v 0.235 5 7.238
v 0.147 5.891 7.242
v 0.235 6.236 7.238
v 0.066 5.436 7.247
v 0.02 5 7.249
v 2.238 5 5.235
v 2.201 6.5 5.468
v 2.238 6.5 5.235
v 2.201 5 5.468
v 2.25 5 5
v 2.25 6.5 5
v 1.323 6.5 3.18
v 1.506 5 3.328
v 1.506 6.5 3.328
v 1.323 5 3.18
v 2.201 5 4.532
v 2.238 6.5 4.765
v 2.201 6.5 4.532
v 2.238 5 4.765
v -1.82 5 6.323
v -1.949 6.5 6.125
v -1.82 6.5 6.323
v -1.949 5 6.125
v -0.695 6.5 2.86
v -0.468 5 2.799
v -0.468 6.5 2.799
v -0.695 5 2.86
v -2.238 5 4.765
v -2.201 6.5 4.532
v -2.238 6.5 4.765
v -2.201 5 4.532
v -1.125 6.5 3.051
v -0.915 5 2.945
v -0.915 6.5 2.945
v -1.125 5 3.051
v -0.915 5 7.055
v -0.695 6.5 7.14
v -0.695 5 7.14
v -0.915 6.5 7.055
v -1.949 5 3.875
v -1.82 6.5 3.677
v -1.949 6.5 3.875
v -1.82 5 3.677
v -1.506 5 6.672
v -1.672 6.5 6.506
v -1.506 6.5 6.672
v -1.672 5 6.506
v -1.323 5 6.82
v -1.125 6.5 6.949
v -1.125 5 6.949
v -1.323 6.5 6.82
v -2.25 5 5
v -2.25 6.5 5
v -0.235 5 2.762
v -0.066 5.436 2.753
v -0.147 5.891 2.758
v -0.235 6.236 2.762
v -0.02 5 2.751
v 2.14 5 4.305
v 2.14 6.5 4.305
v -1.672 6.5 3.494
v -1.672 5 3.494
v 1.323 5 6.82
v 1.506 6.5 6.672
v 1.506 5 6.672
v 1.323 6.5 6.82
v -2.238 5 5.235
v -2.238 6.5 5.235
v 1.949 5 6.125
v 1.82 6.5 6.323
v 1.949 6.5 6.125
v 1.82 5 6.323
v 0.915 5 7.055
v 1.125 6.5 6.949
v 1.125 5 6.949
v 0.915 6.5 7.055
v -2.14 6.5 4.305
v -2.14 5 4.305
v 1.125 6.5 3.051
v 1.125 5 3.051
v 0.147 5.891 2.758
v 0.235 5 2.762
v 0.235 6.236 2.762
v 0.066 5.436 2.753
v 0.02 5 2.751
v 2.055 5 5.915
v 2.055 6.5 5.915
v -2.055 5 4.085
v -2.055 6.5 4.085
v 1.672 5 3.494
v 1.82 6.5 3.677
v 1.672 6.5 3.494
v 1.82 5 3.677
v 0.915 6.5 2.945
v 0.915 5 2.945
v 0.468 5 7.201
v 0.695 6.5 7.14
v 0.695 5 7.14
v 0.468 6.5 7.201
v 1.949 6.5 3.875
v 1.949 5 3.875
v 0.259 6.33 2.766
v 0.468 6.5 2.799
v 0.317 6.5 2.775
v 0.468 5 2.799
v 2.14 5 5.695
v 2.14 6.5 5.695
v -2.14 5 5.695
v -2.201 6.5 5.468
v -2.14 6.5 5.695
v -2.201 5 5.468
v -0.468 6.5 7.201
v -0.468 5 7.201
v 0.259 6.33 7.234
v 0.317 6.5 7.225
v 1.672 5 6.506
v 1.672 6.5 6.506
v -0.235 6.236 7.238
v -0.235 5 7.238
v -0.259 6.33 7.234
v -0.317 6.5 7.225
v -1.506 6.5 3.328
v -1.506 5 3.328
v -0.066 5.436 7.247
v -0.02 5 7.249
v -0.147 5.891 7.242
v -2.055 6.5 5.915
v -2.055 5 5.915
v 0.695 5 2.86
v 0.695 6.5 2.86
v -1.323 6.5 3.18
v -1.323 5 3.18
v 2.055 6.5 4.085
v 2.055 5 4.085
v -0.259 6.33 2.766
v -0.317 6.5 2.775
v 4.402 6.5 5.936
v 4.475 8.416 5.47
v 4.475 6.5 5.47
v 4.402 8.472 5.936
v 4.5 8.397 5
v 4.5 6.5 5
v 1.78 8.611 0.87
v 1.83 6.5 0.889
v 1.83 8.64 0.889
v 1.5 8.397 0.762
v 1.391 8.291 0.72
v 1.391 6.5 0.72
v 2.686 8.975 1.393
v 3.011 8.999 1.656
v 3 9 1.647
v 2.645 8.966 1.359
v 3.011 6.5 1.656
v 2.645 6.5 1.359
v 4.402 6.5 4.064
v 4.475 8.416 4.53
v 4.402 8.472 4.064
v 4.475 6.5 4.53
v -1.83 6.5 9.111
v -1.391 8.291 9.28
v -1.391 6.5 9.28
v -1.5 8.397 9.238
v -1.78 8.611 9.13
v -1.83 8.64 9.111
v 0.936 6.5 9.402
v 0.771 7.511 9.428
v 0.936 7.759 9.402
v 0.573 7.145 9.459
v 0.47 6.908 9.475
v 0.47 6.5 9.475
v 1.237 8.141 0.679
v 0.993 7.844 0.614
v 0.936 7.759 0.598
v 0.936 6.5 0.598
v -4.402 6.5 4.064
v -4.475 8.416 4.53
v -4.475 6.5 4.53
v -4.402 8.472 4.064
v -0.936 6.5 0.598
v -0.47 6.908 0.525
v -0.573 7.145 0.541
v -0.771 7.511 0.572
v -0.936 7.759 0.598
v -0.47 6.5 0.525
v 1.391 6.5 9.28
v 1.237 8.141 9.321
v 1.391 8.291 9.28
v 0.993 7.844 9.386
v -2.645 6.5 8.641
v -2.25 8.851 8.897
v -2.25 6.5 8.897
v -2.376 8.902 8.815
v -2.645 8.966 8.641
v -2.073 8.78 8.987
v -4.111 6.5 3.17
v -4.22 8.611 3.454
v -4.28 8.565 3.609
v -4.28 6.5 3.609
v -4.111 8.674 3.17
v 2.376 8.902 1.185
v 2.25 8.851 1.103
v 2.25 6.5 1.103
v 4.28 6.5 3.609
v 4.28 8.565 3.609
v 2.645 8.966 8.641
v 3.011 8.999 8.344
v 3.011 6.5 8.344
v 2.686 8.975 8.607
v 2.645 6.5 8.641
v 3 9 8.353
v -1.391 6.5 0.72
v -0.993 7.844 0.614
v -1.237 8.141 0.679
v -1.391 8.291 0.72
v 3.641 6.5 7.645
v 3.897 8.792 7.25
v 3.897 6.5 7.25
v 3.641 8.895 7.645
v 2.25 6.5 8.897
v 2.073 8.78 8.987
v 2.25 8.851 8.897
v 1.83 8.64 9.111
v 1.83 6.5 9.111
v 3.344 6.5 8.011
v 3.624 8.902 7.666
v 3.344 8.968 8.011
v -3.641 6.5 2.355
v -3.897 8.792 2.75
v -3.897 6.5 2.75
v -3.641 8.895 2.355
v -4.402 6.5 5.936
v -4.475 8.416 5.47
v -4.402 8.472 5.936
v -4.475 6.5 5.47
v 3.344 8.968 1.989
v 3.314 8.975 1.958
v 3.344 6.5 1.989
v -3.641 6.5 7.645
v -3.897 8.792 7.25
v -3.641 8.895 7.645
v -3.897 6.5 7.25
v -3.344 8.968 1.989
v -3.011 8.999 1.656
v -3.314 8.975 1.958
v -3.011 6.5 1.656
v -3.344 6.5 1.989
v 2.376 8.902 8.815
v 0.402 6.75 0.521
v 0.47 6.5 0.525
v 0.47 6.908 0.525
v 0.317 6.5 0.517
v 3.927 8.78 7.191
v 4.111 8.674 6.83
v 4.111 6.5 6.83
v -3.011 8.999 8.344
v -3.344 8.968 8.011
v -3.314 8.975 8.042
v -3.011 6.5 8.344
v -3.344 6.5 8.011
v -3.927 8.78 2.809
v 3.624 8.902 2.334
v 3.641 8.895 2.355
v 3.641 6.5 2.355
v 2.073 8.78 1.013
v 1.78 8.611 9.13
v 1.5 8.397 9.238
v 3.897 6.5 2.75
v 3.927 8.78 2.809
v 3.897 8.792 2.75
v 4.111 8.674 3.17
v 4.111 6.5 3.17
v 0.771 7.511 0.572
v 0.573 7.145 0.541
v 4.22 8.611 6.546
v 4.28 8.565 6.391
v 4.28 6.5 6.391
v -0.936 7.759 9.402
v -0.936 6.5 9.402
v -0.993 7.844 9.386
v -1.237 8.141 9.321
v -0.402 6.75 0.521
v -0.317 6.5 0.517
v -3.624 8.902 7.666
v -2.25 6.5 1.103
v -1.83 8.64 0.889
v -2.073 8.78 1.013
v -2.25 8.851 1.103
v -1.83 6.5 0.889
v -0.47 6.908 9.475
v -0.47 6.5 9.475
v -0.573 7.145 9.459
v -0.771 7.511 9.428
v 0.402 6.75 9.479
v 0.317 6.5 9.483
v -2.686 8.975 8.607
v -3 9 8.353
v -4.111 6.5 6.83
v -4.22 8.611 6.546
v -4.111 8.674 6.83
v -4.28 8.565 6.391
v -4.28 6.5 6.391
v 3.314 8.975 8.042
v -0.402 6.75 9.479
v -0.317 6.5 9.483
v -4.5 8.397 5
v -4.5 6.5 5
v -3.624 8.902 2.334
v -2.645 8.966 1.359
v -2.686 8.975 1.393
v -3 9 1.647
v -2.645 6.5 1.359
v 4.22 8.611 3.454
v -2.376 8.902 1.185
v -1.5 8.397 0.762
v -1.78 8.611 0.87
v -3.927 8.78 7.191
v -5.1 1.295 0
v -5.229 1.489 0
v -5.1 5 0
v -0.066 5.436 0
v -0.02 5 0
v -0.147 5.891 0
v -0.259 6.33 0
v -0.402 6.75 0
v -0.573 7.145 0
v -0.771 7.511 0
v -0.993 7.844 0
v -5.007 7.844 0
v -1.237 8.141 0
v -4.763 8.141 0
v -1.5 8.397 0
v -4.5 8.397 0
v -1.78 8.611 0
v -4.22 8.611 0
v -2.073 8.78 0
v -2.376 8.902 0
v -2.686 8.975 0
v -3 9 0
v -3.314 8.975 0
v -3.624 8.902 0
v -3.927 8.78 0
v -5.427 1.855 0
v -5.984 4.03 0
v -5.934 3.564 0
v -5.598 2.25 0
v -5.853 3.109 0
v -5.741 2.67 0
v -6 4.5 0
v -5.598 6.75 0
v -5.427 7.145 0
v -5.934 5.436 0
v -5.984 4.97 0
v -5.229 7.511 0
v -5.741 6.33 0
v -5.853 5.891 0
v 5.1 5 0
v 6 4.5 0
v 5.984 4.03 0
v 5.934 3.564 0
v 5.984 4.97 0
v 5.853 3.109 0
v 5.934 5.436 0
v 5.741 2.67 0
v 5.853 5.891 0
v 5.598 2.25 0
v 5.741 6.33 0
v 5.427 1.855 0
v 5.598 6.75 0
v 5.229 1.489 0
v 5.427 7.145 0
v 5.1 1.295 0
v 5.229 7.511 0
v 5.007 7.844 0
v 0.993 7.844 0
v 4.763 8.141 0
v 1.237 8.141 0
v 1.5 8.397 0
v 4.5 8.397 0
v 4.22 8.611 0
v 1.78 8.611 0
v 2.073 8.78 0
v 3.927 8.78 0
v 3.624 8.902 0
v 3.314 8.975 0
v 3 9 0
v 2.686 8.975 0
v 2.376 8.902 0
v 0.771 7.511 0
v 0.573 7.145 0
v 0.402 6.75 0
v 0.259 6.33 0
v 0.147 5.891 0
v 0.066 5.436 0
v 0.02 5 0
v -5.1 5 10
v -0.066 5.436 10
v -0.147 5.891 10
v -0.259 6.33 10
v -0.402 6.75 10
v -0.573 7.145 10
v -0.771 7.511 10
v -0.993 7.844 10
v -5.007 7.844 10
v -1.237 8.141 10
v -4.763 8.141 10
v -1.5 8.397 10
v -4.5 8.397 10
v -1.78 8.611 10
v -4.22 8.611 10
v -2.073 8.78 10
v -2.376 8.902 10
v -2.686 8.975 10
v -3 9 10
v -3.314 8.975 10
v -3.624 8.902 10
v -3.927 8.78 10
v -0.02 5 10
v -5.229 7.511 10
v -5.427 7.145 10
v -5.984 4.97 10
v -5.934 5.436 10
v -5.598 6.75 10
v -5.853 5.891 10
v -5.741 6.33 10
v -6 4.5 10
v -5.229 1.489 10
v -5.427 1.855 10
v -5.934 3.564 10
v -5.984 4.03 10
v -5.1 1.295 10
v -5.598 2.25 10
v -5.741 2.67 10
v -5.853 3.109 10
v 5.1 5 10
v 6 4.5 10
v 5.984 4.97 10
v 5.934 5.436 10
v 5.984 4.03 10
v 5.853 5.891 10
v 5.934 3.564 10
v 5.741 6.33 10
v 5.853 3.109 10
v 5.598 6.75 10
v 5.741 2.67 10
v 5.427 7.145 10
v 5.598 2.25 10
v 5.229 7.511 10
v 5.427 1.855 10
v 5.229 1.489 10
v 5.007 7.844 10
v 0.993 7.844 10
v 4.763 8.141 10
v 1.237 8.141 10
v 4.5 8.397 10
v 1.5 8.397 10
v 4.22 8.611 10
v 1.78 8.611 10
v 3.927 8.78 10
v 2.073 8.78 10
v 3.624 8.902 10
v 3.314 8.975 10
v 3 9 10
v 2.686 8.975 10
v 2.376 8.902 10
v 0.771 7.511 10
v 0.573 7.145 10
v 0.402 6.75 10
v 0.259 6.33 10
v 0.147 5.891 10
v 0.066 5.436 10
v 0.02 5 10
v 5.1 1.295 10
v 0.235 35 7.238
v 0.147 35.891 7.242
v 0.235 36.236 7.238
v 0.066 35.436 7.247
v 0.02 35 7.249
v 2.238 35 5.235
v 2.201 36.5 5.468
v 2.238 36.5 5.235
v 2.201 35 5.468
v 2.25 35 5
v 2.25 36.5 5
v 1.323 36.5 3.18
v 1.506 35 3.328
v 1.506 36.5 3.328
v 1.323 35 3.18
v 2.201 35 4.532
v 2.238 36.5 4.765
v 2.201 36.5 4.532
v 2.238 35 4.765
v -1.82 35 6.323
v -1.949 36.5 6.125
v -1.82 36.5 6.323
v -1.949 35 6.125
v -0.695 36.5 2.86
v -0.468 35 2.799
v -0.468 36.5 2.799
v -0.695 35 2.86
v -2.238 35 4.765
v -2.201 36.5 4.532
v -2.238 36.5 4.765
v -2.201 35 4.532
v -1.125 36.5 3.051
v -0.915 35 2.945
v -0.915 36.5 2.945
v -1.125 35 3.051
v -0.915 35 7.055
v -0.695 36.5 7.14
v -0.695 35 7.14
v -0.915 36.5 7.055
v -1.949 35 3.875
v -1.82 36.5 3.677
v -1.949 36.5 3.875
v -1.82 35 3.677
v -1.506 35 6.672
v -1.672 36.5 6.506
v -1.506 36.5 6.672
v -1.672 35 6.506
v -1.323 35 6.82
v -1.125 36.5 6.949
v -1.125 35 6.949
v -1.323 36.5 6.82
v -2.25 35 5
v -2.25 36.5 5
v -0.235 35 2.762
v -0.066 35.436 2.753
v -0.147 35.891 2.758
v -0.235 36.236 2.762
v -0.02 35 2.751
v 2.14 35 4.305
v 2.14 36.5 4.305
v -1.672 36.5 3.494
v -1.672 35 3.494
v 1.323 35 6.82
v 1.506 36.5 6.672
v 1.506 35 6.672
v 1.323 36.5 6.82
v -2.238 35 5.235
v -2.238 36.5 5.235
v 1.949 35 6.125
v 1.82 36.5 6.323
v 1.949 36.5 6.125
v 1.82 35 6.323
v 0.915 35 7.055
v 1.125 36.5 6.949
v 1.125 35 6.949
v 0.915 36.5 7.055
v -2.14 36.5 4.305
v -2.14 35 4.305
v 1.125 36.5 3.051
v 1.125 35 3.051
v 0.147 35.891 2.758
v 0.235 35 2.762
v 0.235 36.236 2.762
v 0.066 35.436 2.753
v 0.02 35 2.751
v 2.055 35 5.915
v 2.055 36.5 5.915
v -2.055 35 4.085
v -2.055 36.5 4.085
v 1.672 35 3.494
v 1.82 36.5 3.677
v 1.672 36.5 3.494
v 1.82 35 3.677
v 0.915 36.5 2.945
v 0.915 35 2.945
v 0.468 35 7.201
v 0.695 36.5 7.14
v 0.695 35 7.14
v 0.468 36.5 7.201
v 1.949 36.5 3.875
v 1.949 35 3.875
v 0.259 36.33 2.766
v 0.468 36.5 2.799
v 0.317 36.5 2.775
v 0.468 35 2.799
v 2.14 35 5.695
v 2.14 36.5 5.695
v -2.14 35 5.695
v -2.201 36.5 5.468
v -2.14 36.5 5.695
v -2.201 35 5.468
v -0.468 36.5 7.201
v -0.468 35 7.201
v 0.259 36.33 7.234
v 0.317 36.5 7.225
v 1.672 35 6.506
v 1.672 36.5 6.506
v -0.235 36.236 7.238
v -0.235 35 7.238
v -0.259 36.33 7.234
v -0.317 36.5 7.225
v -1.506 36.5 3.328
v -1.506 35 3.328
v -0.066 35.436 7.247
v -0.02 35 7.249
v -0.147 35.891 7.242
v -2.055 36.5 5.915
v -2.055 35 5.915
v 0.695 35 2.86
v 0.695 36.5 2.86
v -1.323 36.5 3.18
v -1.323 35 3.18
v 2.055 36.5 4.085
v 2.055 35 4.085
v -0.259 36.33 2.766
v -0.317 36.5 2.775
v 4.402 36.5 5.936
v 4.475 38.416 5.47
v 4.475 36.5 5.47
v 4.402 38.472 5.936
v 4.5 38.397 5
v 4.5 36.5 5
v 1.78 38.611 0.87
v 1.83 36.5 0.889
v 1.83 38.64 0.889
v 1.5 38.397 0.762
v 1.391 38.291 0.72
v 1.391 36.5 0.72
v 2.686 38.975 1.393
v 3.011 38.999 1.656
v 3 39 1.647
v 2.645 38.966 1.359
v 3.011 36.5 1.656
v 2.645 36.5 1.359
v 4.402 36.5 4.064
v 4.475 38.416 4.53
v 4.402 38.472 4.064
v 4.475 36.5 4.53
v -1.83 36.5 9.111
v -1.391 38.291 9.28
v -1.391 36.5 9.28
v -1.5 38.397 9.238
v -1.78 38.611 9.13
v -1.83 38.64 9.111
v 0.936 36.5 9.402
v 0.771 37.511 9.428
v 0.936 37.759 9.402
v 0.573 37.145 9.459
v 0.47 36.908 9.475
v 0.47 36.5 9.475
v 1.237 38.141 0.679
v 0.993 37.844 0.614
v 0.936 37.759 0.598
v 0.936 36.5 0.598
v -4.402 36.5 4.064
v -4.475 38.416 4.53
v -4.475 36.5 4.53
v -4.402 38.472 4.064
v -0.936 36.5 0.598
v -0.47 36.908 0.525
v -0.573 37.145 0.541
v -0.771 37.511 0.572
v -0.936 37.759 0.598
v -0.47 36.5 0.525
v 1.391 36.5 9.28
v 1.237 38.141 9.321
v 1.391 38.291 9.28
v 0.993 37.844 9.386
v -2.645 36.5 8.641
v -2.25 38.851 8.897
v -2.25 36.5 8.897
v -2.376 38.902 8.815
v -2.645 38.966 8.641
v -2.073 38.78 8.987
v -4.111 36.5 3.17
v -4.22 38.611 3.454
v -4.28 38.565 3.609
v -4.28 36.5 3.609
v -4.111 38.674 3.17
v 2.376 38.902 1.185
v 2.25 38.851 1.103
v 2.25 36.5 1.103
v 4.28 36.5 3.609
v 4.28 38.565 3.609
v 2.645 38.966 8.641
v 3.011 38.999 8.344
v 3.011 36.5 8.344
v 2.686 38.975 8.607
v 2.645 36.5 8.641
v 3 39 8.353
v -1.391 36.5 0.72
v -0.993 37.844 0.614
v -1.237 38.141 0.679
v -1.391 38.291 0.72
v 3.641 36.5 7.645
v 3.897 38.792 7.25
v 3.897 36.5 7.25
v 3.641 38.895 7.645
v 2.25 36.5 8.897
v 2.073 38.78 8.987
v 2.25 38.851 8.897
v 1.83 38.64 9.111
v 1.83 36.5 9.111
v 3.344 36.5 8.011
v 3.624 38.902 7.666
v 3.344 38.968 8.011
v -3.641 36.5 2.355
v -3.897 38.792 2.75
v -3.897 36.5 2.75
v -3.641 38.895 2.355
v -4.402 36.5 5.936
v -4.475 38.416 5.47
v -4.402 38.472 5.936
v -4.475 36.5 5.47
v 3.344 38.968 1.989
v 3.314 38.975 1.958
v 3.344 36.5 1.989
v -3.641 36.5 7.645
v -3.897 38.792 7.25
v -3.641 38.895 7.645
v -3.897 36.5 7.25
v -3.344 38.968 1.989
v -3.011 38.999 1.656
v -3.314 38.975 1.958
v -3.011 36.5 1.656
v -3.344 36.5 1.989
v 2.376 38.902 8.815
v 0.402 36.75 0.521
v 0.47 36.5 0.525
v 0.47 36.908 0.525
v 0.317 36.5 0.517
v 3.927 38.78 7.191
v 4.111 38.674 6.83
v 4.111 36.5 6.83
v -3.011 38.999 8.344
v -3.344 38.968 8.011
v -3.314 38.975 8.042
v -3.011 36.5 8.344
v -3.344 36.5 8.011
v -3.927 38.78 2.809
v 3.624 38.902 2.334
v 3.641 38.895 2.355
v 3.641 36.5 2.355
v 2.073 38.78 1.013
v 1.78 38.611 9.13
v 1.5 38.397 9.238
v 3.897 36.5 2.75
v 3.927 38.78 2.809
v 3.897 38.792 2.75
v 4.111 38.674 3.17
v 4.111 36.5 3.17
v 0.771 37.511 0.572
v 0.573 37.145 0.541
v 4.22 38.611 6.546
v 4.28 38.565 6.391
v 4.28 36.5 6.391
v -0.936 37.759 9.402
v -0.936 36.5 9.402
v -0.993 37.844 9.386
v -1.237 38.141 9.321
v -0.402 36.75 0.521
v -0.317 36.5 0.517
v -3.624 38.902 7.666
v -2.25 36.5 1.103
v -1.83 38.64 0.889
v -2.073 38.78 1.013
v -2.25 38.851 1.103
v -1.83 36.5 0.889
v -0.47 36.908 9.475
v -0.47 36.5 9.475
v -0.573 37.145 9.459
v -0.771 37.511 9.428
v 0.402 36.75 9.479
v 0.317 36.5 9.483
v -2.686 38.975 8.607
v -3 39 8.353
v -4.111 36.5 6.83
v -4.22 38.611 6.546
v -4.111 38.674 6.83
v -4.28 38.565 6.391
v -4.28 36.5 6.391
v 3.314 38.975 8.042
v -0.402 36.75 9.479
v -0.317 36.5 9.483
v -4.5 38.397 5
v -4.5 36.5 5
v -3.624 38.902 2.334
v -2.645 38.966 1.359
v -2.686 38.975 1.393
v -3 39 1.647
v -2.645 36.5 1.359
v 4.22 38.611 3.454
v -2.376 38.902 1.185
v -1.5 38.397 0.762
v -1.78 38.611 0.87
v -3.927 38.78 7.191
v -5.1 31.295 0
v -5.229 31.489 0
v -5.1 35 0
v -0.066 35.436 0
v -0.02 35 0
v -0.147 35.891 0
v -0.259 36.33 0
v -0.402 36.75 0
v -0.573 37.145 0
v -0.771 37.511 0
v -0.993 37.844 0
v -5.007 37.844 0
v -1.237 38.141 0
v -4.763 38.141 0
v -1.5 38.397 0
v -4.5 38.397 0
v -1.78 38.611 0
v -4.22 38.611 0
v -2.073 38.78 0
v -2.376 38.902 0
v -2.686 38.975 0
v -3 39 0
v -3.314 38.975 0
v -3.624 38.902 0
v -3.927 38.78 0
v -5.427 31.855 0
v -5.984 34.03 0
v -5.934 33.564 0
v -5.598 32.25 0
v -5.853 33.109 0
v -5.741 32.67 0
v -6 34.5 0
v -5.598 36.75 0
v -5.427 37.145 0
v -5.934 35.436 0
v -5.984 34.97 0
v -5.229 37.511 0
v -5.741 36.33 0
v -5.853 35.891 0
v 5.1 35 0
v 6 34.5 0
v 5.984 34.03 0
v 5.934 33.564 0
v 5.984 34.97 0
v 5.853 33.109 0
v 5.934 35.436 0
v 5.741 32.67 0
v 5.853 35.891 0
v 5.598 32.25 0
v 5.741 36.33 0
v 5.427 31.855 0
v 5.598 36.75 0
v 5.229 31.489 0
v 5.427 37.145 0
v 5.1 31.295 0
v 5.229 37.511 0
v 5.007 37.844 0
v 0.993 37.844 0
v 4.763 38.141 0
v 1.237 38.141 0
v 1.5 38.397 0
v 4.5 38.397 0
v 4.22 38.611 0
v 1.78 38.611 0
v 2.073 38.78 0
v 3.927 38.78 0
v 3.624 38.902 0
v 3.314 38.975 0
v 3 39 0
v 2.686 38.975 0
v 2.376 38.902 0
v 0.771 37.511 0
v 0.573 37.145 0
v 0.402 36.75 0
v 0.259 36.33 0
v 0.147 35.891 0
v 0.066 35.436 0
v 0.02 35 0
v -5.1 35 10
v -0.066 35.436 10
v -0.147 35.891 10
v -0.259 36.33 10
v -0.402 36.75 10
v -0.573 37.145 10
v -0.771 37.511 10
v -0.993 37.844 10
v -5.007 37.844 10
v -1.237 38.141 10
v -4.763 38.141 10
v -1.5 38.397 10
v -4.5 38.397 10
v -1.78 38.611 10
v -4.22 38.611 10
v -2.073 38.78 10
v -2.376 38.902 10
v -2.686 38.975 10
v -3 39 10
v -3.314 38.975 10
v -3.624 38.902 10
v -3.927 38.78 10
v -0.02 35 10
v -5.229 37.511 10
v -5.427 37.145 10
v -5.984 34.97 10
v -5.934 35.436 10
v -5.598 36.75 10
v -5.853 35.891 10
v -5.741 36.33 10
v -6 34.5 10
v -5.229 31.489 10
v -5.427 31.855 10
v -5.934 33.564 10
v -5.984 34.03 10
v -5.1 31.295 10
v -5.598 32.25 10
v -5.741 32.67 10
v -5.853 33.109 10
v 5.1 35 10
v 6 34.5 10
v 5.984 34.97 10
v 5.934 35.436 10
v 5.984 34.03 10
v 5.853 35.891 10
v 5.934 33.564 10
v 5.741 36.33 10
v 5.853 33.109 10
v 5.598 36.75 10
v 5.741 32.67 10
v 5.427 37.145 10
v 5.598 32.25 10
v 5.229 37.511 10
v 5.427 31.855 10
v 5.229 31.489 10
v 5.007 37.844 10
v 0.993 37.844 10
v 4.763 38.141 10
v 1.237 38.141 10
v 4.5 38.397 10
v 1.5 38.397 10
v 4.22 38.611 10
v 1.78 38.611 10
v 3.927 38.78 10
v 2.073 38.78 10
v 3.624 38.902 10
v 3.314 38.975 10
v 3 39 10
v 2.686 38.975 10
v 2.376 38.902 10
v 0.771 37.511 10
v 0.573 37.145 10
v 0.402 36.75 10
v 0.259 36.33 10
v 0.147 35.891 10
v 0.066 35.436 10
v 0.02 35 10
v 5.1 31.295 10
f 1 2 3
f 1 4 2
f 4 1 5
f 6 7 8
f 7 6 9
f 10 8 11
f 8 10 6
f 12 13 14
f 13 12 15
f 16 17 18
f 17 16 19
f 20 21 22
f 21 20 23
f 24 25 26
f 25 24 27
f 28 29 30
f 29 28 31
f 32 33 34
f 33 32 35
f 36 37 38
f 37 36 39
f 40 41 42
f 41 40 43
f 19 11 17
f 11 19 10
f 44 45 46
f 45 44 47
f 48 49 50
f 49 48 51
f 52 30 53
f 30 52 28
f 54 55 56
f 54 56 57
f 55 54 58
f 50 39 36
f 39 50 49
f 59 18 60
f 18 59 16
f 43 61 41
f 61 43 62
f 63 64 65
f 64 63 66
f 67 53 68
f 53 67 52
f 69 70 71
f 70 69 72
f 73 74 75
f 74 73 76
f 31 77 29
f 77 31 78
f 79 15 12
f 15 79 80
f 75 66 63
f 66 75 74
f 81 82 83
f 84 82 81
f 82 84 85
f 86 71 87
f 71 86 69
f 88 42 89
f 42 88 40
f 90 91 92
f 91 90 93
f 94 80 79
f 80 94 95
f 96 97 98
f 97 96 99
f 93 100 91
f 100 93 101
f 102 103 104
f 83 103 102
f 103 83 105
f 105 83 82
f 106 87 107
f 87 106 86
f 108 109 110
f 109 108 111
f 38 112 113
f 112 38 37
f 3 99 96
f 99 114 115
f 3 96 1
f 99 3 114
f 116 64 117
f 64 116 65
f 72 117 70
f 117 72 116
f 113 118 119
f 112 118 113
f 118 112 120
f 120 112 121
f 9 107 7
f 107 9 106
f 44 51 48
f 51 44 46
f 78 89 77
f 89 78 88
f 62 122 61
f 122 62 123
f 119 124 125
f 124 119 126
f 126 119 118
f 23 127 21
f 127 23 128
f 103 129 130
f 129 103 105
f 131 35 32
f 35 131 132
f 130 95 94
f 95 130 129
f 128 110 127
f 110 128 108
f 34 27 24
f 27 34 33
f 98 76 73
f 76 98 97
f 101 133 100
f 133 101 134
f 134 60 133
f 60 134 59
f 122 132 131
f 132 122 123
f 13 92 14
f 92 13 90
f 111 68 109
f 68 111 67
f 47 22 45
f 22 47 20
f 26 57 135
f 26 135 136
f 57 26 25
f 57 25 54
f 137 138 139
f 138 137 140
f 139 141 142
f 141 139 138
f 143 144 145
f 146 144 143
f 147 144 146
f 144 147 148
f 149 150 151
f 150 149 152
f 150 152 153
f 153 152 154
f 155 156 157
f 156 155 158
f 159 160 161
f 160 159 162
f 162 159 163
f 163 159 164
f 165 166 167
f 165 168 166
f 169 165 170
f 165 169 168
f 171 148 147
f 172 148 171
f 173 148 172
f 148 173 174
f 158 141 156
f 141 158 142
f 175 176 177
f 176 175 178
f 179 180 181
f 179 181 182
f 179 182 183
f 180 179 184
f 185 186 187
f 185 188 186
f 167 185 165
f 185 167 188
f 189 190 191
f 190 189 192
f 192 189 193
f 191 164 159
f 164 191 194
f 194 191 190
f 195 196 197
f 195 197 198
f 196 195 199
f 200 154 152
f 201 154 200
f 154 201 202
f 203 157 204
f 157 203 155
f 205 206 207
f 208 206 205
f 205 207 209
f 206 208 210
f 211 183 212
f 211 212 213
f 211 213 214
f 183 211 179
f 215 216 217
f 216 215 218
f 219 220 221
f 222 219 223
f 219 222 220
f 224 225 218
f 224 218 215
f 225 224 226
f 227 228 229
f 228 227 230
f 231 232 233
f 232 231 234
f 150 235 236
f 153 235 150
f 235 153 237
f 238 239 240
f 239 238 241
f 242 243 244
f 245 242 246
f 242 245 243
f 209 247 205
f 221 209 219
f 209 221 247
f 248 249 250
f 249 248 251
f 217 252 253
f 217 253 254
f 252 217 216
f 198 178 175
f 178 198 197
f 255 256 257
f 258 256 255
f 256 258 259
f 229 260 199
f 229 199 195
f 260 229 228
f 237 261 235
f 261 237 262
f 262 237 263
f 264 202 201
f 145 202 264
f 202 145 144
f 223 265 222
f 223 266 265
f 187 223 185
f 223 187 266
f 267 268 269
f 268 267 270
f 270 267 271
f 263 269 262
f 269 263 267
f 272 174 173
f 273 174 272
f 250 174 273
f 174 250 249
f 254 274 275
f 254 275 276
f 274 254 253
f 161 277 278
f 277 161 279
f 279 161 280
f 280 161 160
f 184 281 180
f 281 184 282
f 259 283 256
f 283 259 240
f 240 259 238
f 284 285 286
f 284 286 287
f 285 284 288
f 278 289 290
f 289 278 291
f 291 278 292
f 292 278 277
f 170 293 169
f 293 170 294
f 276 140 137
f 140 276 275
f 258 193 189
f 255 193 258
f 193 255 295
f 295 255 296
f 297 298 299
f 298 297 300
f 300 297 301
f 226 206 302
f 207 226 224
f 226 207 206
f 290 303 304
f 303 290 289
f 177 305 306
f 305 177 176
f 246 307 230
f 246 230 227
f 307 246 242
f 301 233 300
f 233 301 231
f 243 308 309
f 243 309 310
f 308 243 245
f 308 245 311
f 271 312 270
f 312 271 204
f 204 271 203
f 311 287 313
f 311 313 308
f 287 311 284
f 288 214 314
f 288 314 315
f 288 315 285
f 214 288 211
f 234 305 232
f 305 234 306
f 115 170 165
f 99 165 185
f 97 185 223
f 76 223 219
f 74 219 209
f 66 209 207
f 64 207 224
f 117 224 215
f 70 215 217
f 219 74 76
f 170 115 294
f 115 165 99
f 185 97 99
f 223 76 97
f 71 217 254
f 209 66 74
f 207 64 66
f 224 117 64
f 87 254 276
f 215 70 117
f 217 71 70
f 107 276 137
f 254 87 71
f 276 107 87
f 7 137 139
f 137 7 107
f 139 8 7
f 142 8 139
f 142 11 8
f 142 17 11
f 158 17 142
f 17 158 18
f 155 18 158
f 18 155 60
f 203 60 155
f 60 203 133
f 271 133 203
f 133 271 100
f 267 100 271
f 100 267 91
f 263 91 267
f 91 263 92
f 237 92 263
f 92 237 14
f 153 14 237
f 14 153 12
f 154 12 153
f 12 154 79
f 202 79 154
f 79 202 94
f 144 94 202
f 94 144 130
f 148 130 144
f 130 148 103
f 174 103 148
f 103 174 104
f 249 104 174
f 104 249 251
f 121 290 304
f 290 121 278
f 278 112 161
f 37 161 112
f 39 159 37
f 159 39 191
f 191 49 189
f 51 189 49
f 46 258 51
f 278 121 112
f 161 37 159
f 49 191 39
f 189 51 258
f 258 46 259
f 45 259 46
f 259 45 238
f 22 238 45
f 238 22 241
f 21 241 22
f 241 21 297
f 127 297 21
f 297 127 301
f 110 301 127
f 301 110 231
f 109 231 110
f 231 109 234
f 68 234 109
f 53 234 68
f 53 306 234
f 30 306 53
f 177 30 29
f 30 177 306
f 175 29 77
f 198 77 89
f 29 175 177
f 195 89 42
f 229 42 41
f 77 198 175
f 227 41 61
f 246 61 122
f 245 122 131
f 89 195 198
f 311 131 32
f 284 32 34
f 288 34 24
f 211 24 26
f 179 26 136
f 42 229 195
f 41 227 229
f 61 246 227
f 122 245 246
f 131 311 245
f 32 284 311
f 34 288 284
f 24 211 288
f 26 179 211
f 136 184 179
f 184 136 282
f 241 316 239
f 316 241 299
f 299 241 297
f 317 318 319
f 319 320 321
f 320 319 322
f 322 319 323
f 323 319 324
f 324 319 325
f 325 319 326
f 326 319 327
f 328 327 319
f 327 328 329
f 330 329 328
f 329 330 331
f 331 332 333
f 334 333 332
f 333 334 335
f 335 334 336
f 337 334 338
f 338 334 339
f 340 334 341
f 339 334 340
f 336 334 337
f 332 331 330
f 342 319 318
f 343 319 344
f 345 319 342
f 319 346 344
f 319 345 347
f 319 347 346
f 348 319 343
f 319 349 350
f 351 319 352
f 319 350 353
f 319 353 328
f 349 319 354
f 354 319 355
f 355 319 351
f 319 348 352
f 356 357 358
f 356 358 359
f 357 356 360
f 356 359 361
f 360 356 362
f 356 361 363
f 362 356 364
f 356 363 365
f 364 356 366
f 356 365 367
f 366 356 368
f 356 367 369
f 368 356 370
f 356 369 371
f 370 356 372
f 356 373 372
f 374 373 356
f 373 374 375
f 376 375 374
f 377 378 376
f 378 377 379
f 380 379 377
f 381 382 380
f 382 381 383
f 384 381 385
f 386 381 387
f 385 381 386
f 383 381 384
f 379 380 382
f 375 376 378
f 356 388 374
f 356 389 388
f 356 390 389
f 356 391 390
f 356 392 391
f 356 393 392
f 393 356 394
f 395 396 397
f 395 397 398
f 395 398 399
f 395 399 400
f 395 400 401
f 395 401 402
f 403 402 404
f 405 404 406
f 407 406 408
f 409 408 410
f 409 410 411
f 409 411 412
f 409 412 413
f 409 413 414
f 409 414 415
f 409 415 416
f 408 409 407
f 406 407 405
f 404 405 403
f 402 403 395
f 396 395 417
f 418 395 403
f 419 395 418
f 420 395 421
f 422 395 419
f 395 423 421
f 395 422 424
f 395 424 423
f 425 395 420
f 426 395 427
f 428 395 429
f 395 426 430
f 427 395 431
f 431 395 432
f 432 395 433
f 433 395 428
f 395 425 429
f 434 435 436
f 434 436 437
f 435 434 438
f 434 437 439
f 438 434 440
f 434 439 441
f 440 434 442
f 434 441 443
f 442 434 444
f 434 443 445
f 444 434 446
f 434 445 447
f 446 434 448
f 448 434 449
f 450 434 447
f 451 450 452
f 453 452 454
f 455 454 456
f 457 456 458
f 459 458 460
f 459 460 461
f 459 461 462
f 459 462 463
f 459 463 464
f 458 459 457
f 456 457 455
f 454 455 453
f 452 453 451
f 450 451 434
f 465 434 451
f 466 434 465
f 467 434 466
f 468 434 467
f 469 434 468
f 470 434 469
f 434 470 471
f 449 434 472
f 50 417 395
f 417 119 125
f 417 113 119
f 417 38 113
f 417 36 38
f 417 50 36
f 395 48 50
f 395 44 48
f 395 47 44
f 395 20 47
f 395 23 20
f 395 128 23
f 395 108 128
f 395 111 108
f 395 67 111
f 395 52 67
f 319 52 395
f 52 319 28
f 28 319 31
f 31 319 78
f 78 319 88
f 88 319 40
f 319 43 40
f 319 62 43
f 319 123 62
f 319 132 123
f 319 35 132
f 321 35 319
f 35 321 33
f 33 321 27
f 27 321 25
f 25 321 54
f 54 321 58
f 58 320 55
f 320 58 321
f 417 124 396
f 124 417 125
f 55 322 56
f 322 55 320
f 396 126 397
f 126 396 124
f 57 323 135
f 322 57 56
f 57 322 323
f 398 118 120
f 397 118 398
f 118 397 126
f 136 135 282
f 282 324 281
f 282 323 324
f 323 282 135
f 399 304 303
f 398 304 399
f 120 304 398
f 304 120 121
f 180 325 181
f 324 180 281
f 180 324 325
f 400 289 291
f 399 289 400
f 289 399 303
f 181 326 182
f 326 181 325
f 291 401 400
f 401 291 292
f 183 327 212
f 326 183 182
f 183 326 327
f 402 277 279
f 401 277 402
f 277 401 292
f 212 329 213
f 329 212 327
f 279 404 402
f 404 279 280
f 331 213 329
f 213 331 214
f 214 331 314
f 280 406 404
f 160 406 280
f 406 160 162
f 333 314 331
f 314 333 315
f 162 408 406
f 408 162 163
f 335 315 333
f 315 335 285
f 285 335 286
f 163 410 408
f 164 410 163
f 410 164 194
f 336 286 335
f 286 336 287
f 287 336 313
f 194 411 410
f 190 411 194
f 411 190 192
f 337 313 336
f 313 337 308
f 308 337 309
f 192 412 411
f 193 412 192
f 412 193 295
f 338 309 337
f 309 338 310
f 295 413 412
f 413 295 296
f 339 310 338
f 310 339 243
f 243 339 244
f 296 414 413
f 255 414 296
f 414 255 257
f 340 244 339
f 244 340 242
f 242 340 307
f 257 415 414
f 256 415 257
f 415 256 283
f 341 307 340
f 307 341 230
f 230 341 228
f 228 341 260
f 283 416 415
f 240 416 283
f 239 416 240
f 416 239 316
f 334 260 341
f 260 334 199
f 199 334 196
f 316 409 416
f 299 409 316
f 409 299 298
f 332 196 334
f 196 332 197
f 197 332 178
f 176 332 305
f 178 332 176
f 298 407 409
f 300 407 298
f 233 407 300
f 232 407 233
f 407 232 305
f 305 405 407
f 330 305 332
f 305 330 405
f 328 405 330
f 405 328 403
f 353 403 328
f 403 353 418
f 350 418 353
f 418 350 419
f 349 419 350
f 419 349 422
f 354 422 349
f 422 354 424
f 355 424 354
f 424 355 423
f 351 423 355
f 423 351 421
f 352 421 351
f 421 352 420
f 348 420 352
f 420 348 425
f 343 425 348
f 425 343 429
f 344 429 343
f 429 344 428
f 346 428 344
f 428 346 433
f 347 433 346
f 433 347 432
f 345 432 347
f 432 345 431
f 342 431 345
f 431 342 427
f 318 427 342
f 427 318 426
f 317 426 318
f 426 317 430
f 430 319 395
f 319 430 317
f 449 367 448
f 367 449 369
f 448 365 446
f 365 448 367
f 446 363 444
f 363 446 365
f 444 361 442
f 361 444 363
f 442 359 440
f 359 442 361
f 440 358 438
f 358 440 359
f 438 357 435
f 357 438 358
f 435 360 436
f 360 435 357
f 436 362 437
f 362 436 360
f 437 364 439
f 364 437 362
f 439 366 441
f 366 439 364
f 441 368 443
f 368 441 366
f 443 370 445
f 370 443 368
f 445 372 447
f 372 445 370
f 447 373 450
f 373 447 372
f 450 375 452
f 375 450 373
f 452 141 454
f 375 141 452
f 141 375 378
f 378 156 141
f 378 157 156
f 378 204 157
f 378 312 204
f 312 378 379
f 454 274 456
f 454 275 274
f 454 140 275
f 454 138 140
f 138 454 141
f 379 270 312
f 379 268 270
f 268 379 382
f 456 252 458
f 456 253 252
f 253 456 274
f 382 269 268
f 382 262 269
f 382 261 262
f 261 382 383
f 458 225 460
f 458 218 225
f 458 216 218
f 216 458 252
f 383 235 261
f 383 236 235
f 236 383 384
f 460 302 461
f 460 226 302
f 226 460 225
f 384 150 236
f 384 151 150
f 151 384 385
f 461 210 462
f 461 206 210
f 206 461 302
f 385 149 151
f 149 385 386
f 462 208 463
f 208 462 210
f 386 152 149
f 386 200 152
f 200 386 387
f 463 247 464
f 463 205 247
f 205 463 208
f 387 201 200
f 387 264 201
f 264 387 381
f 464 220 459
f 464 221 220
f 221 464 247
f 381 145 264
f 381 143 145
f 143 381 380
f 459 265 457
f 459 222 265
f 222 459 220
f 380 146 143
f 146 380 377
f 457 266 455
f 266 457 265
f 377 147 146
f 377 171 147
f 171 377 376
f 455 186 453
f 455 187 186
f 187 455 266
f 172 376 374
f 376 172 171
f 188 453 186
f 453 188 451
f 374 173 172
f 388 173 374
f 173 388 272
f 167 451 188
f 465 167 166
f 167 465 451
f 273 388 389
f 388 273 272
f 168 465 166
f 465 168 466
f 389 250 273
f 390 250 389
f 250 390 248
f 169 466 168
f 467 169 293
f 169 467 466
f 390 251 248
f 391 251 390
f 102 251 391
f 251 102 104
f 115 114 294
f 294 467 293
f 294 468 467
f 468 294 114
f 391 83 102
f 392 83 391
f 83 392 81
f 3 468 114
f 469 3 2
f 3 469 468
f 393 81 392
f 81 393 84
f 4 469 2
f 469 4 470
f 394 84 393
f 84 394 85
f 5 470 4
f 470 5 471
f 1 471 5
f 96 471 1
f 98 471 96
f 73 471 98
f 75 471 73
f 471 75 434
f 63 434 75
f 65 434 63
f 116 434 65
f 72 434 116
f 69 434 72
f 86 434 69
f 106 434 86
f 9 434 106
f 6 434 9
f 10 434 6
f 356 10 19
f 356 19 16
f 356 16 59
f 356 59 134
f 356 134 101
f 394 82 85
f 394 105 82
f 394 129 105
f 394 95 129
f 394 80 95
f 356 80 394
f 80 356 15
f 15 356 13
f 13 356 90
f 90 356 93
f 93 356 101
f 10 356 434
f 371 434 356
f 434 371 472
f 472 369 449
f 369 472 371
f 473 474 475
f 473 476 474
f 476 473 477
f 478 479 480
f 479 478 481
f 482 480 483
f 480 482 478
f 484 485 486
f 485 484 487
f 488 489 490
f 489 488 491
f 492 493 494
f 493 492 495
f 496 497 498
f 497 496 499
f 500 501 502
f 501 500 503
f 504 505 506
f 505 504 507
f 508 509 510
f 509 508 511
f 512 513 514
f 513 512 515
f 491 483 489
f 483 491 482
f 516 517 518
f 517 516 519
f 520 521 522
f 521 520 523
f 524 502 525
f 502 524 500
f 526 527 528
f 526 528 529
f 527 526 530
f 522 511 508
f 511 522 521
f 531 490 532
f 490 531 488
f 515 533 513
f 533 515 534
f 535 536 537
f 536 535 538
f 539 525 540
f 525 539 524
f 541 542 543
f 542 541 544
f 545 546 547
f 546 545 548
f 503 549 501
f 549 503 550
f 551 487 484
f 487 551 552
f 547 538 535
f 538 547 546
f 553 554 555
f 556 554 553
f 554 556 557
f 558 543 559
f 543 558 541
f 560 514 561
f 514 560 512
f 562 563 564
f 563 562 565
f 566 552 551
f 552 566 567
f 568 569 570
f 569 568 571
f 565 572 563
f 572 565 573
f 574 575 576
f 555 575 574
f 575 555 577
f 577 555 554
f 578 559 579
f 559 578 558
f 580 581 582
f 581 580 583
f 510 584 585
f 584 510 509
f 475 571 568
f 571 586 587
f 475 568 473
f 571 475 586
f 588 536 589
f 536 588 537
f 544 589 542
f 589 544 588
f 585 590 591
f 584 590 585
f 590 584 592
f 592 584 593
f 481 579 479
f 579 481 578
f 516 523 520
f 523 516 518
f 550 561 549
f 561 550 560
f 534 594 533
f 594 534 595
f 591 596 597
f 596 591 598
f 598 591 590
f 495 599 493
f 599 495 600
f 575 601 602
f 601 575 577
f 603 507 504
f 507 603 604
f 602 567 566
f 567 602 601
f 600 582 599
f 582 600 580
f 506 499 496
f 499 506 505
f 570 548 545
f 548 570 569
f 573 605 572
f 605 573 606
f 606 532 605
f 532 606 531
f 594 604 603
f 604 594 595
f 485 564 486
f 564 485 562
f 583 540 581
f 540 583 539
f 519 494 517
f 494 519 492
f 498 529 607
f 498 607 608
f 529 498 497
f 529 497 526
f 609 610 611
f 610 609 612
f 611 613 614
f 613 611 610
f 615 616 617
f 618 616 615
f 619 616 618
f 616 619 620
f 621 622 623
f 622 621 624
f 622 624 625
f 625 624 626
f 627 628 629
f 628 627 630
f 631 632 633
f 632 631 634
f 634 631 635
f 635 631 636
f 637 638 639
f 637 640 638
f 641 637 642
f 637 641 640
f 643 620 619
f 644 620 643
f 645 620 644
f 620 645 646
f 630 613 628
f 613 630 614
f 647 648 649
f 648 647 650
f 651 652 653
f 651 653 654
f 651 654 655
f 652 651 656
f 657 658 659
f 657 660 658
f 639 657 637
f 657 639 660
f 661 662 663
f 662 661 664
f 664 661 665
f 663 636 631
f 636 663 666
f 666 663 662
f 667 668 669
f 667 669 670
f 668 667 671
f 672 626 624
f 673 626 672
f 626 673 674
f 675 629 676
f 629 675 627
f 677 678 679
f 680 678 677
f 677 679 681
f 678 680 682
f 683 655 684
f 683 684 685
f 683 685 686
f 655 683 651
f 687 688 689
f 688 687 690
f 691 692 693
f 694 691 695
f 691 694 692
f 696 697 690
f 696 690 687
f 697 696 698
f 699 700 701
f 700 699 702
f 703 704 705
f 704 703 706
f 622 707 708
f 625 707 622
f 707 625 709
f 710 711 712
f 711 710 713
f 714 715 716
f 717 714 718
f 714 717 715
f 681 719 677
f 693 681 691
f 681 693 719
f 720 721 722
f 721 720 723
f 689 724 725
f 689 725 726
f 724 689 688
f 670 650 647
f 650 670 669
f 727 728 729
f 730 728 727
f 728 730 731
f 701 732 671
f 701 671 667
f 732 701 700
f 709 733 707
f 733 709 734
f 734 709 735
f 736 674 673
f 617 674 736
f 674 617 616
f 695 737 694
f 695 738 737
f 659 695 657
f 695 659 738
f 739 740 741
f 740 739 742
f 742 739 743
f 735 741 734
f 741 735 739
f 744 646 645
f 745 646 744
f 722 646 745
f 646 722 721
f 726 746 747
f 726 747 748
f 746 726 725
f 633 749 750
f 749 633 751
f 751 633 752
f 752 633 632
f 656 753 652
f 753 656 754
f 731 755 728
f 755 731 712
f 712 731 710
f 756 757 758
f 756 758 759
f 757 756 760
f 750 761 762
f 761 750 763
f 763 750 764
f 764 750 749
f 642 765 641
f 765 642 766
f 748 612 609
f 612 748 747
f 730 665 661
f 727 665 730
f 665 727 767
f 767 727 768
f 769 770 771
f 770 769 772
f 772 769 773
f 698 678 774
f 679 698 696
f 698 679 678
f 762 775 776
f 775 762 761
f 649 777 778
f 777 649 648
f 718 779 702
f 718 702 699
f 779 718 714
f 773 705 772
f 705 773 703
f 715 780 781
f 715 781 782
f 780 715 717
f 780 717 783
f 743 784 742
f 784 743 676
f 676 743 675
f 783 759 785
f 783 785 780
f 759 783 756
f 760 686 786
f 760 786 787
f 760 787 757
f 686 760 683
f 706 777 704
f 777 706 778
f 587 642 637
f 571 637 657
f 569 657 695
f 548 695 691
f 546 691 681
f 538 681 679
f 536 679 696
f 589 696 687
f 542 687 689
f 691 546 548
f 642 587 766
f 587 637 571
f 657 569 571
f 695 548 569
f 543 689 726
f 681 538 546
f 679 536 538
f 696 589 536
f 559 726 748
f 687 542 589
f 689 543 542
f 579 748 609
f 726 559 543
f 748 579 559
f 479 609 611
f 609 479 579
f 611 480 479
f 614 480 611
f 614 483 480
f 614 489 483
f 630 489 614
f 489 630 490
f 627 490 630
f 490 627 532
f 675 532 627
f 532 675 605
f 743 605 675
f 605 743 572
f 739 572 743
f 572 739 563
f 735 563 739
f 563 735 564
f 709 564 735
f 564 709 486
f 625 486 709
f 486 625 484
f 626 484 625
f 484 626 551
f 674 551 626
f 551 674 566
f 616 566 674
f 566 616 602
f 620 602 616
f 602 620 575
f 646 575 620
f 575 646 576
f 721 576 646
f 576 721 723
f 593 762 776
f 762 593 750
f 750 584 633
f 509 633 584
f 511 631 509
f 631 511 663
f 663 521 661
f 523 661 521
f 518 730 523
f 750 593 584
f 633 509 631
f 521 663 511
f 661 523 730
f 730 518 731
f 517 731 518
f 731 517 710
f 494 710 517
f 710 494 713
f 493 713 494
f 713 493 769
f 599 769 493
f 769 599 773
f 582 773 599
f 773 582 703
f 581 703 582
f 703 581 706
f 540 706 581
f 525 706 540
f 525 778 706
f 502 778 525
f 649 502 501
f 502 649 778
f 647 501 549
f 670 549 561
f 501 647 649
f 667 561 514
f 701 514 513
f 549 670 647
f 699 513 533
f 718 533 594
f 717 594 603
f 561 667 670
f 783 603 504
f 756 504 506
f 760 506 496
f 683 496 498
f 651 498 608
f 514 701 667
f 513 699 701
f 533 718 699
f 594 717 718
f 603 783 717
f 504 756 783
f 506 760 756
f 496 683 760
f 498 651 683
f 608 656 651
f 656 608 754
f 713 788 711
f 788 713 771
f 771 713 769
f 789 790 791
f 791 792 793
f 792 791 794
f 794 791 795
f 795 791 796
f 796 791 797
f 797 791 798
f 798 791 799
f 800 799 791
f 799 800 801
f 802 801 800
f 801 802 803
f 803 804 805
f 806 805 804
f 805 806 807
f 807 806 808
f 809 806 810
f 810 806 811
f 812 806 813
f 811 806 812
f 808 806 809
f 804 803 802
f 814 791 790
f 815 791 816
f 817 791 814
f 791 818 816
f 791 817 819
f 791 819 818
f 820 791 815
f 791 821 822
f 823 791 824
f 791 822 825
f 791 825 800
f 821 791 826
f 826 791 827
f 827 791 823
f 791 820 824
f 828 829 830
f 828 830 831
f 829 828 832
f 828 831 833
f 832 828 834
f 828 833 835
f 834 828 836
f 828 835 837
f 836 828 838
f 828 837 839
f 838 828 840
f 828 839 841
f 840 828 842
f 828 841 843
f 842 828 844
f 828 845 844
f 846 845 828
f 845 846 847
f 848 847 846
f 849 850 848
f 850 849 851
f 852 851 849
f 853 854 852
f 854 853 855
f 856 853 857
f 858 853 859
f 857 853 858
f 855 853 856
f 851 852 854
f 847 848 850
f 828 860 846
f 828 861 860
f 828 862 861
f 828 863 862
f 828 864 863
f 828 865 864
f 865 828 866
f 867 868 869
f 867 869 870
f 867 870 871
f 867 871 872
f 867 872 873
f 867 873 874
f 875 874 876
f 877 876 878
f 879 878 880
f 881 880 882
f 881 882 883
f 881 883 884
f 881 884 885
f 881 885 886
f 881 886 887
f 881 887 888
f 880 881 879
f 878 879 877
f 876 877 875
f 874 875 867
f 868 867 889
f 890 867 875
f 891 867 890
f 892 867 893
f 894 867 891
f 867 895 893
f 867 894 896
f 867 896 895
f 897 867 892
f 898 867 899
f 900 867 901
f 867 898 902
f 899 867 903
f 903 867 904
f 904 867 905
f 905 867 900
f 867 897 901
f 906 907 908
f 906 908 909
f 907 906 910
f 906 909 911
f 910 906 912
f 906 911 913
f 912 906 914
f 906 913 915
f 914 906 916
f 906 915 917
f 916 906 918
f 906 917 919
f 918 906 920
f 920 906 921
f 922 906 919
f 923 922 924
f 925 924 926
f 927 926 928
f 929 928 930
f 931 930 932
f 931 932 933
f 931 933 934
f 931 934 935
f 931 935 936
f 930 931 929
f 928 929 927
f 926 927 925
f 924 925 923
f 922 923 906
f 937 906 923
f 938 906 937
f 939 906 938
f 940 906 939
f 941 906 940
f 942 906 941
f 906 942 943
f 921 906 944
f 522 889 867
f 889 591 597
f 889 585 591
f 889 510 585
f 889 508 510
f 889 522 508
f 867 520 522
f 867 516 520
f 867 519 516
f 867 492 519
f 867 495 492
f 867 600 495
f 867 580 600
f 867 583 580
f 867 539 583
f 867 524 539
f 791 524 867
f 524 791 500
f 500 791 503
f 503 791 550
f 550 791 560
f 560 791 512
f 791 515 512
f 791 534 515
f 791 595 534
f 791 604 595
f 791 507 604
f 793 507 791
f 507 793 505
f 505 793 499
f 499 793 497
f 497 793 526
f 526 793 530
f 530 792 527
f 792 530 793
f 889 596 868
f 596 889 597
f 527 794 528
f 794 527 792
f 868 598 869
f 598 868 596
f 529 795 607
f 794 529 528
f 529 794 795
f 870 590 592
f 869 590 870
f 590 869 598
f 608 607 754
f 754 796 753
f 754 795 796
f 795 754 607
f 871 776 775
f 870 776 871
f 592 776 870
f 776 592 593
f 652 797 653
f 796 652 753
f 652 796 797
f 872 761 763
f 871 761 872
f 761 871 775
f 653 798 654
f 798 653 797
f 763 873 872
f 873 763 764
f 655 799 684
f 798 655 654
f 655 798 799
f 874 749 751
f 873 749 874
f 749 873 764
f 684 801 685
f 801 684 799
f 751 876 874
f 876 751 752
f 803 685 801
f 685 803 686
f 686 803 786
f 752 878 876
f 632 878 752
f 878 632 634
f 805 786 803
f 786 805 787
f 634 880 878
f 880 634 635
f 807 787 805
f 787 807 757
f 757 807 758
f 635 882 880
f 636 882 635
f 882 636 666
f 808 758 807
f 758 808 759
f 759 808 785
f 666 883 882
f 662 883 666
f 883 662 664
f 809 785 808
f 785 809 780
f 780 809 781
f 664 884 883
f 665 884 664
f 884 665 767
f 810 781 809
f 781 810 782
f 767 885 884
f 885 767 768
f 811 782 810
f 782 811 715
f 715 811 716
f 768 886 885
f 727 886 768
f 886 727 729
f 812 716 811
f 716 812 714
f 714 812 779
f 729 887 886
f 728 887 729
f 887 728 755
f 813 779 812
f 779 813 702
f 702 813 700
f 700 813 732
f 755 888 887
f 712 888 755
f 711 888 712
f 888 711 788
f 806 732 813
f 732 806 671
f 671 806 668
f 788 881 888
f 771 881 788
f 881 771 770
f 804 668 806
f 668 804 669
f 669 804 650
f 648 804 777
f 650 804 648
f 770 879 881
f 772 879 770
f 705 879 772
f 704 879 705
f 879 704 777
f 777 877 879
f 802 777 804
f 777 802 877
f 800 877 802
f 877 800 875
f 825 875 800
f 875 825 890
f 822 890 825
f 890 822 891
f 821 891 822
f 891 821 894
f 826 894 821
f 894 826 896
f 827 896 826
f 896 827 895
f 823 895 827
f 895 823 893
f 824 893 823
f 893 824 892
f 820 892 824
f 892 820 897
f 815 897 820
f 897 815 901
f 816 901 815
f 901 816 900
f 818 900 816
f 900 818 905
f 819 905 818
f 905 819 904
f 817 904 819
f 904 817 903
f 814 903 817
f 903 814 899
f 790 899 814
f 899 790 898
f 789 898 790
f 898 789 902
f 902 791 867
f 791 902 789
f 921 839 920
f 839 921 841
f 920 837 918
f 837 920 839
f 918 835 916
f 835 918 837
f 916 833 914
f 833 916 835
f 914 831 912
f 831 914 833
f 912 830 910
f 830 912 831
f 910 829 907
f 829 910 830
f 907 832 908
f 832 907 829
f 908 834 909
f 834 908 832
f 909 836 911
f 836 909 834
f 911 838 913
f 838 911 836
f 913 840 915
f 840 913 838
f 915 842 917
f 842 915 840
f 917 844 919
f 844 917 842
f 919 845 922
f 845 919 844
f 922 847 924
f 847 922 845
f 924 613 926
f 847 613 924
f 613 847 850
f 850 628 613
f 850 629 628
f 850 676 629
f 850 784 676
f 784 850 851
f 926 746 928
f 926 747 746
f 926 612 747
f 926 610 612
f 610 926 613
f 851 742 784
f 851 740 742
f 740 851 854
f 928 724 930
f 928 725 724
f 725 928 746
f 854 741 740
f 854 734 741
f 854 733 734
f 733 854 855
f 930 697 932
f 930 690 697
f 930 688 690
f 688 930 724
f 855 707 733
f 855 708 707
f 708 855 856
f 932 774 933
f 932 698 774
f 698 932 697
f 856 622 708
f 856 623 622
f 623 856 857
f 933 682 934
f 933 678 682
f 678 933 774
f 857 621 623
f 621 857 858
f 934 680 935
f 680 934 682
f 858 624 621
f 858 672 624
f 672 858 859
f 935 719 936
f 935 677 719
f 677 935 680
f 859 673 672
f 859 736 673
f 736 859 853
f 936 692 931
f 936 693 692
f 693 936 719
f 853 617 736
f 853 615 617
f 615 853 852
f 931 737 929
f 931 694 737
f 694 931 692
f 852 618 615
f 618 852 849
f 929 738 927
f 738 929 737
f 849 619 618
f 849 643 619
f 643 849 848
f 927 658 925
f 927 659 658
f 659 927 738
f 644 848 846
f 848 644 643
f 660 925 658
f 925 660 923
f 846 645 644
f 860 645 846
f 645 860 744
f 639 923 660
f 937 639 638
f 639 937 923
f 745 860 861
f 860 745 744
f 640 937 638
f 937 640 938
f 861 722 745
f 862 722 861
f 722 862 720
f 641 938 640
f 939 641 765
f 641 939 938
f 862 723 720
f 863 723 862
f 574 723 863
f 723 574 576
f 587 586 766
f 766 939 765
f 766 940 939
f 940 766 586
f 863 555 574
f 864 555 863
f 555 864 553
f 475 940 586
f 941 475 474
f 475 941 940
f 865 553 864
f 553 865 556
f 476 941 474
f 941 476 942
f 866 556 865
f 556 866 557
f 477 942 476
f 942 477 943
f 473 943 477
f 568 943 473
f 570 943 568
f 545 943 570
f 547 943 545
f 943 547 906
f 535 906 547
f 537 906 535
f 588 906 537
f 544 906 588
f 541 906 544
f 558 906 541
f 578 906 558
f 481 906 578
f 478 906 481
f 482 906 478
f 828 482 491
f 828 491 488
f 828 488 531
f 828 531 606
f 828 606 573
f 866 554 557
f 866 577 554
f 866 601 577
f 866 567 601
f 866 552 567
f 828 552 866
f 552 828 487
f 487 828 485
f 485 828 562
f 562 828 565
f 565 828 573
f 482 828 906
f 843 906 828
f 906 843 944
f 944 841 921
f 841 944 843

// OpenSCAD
// file: common.scad
// Material strength
base_height = 10;
flex_width  = 3;
width       = 10;


module holders(
    length_total,
    length_inner,
    width_total,
    width_inner,
    height
) {
    height_total = height + base_height;
    height_inner = height;

    holder_lengthwise(
        length_total = length_total,
        length_inner = length_inner,
        height_total = height_total,
        height_inner = height_inner
    );

    translate([0, 30, 0])
    holder_widthwise(
        width_total  = width_total,
        width_inner  = width_inner,
        height_total = height_total,
        height_inner = height_inner
    );
}

module holder_lengthwise(
    length_total,
    length_inner,
    height_total,
    height_inner
) {
    holder(
        length_total = length_total,
        length_inner = length_inner,
        height_total = height_total,
        height_inner = height_inner,
        slot_offset  = 0.0
    );
}

module holder_widthwise(
    width_total,
    width_inner,
    height_total,
    height_inner
) {
    holder(
        length_total = width_total,
        length_inner = width_inner,
        height_total = height_total,
        height_inner = height_inner,
        slot_offset  = 1.0
    );
}

module holder(
    length_total,
    length_inner,
    height_total,
    height_inner,
    slot_offset
) {
    base_height = height_total - height_inner;

    difference() {
        linear_extrude(width)
        difference() {
            union() {
                polygon([
                    [-length_total / 2, 0],
                    [ length_total / 2, 0],
                    [ length_total / 2, height_total],
                    [ length_inner / 2, height_total],
                    [ length_inner / 2, base_height],
                    [-length_inner / 2, base_height],
                    [-length_inner / 2, height_total],
                    [-length_total / 2, height_total],
                ]);

                translate([-length_total / 2, height_total])
                lump(1);

                translate([length_total / 2, height_total])
                lump(-1);

                translate([-length_inner / 2, base_height])
                chamfer(1.0);

                translate([length_inner / 2, base_height])
                chamfer(-1.0);
            }

            slot_size = [width + 0.2, base_height];

            translate([length_total * 0.25, base_height * slot_offset])
            square(slot_size, center = true);

            translate([length_total * -0.25, base_height * slot_offset])
            square(slot_size, center = true);
        }

        translate([-0.25 * length_total, 0, 0])
        hole();

        translate([0.25 * length_total, 0, 0])
        hole();
    }

    module lump(direction) {
        s = 1.5;
        d = flex_width * 2.0;
        r = d / 2;

        union() {
            scale([1, s])
            translate([r * direction, r])
            circle(d = d);

            overlap = 1;
            square_x = flex_width;
            square_y = r * s;

            translate([square_x / 2 * direction, (square_y - overlap) / 2])
            square([square_x, square_y + overlap], center = true);
        }
    }

    module chamfer(f) {
        r = 1.0;

        difference() {
            square([r, r] * 2, center = true);

            translate([f * r, r])
            circle(r = r);
        }
    }

    module hole() {
        protrusion = 2;

        hole_diameter = 4.5;
        hole_height   = base_height;
        head_diameter = 9;
        head_height   = 3.5;

        translate([0, hole_height + protrusion, width / 2])
        rotate(90, [1, 0, 0])
        union() {
            cylinder(d = hole_diameter, h = hole_height + protrusion * 2);
            cylinder(d = head_diameter, h = head_height + protrusion);
        }
    }
}
// main file
use <common.scad>;

$fn = 60;

holders(
    length = 180,
    width  =  54.5,
    height =  41,

    slot_offset_widthwise = 0.35
);
